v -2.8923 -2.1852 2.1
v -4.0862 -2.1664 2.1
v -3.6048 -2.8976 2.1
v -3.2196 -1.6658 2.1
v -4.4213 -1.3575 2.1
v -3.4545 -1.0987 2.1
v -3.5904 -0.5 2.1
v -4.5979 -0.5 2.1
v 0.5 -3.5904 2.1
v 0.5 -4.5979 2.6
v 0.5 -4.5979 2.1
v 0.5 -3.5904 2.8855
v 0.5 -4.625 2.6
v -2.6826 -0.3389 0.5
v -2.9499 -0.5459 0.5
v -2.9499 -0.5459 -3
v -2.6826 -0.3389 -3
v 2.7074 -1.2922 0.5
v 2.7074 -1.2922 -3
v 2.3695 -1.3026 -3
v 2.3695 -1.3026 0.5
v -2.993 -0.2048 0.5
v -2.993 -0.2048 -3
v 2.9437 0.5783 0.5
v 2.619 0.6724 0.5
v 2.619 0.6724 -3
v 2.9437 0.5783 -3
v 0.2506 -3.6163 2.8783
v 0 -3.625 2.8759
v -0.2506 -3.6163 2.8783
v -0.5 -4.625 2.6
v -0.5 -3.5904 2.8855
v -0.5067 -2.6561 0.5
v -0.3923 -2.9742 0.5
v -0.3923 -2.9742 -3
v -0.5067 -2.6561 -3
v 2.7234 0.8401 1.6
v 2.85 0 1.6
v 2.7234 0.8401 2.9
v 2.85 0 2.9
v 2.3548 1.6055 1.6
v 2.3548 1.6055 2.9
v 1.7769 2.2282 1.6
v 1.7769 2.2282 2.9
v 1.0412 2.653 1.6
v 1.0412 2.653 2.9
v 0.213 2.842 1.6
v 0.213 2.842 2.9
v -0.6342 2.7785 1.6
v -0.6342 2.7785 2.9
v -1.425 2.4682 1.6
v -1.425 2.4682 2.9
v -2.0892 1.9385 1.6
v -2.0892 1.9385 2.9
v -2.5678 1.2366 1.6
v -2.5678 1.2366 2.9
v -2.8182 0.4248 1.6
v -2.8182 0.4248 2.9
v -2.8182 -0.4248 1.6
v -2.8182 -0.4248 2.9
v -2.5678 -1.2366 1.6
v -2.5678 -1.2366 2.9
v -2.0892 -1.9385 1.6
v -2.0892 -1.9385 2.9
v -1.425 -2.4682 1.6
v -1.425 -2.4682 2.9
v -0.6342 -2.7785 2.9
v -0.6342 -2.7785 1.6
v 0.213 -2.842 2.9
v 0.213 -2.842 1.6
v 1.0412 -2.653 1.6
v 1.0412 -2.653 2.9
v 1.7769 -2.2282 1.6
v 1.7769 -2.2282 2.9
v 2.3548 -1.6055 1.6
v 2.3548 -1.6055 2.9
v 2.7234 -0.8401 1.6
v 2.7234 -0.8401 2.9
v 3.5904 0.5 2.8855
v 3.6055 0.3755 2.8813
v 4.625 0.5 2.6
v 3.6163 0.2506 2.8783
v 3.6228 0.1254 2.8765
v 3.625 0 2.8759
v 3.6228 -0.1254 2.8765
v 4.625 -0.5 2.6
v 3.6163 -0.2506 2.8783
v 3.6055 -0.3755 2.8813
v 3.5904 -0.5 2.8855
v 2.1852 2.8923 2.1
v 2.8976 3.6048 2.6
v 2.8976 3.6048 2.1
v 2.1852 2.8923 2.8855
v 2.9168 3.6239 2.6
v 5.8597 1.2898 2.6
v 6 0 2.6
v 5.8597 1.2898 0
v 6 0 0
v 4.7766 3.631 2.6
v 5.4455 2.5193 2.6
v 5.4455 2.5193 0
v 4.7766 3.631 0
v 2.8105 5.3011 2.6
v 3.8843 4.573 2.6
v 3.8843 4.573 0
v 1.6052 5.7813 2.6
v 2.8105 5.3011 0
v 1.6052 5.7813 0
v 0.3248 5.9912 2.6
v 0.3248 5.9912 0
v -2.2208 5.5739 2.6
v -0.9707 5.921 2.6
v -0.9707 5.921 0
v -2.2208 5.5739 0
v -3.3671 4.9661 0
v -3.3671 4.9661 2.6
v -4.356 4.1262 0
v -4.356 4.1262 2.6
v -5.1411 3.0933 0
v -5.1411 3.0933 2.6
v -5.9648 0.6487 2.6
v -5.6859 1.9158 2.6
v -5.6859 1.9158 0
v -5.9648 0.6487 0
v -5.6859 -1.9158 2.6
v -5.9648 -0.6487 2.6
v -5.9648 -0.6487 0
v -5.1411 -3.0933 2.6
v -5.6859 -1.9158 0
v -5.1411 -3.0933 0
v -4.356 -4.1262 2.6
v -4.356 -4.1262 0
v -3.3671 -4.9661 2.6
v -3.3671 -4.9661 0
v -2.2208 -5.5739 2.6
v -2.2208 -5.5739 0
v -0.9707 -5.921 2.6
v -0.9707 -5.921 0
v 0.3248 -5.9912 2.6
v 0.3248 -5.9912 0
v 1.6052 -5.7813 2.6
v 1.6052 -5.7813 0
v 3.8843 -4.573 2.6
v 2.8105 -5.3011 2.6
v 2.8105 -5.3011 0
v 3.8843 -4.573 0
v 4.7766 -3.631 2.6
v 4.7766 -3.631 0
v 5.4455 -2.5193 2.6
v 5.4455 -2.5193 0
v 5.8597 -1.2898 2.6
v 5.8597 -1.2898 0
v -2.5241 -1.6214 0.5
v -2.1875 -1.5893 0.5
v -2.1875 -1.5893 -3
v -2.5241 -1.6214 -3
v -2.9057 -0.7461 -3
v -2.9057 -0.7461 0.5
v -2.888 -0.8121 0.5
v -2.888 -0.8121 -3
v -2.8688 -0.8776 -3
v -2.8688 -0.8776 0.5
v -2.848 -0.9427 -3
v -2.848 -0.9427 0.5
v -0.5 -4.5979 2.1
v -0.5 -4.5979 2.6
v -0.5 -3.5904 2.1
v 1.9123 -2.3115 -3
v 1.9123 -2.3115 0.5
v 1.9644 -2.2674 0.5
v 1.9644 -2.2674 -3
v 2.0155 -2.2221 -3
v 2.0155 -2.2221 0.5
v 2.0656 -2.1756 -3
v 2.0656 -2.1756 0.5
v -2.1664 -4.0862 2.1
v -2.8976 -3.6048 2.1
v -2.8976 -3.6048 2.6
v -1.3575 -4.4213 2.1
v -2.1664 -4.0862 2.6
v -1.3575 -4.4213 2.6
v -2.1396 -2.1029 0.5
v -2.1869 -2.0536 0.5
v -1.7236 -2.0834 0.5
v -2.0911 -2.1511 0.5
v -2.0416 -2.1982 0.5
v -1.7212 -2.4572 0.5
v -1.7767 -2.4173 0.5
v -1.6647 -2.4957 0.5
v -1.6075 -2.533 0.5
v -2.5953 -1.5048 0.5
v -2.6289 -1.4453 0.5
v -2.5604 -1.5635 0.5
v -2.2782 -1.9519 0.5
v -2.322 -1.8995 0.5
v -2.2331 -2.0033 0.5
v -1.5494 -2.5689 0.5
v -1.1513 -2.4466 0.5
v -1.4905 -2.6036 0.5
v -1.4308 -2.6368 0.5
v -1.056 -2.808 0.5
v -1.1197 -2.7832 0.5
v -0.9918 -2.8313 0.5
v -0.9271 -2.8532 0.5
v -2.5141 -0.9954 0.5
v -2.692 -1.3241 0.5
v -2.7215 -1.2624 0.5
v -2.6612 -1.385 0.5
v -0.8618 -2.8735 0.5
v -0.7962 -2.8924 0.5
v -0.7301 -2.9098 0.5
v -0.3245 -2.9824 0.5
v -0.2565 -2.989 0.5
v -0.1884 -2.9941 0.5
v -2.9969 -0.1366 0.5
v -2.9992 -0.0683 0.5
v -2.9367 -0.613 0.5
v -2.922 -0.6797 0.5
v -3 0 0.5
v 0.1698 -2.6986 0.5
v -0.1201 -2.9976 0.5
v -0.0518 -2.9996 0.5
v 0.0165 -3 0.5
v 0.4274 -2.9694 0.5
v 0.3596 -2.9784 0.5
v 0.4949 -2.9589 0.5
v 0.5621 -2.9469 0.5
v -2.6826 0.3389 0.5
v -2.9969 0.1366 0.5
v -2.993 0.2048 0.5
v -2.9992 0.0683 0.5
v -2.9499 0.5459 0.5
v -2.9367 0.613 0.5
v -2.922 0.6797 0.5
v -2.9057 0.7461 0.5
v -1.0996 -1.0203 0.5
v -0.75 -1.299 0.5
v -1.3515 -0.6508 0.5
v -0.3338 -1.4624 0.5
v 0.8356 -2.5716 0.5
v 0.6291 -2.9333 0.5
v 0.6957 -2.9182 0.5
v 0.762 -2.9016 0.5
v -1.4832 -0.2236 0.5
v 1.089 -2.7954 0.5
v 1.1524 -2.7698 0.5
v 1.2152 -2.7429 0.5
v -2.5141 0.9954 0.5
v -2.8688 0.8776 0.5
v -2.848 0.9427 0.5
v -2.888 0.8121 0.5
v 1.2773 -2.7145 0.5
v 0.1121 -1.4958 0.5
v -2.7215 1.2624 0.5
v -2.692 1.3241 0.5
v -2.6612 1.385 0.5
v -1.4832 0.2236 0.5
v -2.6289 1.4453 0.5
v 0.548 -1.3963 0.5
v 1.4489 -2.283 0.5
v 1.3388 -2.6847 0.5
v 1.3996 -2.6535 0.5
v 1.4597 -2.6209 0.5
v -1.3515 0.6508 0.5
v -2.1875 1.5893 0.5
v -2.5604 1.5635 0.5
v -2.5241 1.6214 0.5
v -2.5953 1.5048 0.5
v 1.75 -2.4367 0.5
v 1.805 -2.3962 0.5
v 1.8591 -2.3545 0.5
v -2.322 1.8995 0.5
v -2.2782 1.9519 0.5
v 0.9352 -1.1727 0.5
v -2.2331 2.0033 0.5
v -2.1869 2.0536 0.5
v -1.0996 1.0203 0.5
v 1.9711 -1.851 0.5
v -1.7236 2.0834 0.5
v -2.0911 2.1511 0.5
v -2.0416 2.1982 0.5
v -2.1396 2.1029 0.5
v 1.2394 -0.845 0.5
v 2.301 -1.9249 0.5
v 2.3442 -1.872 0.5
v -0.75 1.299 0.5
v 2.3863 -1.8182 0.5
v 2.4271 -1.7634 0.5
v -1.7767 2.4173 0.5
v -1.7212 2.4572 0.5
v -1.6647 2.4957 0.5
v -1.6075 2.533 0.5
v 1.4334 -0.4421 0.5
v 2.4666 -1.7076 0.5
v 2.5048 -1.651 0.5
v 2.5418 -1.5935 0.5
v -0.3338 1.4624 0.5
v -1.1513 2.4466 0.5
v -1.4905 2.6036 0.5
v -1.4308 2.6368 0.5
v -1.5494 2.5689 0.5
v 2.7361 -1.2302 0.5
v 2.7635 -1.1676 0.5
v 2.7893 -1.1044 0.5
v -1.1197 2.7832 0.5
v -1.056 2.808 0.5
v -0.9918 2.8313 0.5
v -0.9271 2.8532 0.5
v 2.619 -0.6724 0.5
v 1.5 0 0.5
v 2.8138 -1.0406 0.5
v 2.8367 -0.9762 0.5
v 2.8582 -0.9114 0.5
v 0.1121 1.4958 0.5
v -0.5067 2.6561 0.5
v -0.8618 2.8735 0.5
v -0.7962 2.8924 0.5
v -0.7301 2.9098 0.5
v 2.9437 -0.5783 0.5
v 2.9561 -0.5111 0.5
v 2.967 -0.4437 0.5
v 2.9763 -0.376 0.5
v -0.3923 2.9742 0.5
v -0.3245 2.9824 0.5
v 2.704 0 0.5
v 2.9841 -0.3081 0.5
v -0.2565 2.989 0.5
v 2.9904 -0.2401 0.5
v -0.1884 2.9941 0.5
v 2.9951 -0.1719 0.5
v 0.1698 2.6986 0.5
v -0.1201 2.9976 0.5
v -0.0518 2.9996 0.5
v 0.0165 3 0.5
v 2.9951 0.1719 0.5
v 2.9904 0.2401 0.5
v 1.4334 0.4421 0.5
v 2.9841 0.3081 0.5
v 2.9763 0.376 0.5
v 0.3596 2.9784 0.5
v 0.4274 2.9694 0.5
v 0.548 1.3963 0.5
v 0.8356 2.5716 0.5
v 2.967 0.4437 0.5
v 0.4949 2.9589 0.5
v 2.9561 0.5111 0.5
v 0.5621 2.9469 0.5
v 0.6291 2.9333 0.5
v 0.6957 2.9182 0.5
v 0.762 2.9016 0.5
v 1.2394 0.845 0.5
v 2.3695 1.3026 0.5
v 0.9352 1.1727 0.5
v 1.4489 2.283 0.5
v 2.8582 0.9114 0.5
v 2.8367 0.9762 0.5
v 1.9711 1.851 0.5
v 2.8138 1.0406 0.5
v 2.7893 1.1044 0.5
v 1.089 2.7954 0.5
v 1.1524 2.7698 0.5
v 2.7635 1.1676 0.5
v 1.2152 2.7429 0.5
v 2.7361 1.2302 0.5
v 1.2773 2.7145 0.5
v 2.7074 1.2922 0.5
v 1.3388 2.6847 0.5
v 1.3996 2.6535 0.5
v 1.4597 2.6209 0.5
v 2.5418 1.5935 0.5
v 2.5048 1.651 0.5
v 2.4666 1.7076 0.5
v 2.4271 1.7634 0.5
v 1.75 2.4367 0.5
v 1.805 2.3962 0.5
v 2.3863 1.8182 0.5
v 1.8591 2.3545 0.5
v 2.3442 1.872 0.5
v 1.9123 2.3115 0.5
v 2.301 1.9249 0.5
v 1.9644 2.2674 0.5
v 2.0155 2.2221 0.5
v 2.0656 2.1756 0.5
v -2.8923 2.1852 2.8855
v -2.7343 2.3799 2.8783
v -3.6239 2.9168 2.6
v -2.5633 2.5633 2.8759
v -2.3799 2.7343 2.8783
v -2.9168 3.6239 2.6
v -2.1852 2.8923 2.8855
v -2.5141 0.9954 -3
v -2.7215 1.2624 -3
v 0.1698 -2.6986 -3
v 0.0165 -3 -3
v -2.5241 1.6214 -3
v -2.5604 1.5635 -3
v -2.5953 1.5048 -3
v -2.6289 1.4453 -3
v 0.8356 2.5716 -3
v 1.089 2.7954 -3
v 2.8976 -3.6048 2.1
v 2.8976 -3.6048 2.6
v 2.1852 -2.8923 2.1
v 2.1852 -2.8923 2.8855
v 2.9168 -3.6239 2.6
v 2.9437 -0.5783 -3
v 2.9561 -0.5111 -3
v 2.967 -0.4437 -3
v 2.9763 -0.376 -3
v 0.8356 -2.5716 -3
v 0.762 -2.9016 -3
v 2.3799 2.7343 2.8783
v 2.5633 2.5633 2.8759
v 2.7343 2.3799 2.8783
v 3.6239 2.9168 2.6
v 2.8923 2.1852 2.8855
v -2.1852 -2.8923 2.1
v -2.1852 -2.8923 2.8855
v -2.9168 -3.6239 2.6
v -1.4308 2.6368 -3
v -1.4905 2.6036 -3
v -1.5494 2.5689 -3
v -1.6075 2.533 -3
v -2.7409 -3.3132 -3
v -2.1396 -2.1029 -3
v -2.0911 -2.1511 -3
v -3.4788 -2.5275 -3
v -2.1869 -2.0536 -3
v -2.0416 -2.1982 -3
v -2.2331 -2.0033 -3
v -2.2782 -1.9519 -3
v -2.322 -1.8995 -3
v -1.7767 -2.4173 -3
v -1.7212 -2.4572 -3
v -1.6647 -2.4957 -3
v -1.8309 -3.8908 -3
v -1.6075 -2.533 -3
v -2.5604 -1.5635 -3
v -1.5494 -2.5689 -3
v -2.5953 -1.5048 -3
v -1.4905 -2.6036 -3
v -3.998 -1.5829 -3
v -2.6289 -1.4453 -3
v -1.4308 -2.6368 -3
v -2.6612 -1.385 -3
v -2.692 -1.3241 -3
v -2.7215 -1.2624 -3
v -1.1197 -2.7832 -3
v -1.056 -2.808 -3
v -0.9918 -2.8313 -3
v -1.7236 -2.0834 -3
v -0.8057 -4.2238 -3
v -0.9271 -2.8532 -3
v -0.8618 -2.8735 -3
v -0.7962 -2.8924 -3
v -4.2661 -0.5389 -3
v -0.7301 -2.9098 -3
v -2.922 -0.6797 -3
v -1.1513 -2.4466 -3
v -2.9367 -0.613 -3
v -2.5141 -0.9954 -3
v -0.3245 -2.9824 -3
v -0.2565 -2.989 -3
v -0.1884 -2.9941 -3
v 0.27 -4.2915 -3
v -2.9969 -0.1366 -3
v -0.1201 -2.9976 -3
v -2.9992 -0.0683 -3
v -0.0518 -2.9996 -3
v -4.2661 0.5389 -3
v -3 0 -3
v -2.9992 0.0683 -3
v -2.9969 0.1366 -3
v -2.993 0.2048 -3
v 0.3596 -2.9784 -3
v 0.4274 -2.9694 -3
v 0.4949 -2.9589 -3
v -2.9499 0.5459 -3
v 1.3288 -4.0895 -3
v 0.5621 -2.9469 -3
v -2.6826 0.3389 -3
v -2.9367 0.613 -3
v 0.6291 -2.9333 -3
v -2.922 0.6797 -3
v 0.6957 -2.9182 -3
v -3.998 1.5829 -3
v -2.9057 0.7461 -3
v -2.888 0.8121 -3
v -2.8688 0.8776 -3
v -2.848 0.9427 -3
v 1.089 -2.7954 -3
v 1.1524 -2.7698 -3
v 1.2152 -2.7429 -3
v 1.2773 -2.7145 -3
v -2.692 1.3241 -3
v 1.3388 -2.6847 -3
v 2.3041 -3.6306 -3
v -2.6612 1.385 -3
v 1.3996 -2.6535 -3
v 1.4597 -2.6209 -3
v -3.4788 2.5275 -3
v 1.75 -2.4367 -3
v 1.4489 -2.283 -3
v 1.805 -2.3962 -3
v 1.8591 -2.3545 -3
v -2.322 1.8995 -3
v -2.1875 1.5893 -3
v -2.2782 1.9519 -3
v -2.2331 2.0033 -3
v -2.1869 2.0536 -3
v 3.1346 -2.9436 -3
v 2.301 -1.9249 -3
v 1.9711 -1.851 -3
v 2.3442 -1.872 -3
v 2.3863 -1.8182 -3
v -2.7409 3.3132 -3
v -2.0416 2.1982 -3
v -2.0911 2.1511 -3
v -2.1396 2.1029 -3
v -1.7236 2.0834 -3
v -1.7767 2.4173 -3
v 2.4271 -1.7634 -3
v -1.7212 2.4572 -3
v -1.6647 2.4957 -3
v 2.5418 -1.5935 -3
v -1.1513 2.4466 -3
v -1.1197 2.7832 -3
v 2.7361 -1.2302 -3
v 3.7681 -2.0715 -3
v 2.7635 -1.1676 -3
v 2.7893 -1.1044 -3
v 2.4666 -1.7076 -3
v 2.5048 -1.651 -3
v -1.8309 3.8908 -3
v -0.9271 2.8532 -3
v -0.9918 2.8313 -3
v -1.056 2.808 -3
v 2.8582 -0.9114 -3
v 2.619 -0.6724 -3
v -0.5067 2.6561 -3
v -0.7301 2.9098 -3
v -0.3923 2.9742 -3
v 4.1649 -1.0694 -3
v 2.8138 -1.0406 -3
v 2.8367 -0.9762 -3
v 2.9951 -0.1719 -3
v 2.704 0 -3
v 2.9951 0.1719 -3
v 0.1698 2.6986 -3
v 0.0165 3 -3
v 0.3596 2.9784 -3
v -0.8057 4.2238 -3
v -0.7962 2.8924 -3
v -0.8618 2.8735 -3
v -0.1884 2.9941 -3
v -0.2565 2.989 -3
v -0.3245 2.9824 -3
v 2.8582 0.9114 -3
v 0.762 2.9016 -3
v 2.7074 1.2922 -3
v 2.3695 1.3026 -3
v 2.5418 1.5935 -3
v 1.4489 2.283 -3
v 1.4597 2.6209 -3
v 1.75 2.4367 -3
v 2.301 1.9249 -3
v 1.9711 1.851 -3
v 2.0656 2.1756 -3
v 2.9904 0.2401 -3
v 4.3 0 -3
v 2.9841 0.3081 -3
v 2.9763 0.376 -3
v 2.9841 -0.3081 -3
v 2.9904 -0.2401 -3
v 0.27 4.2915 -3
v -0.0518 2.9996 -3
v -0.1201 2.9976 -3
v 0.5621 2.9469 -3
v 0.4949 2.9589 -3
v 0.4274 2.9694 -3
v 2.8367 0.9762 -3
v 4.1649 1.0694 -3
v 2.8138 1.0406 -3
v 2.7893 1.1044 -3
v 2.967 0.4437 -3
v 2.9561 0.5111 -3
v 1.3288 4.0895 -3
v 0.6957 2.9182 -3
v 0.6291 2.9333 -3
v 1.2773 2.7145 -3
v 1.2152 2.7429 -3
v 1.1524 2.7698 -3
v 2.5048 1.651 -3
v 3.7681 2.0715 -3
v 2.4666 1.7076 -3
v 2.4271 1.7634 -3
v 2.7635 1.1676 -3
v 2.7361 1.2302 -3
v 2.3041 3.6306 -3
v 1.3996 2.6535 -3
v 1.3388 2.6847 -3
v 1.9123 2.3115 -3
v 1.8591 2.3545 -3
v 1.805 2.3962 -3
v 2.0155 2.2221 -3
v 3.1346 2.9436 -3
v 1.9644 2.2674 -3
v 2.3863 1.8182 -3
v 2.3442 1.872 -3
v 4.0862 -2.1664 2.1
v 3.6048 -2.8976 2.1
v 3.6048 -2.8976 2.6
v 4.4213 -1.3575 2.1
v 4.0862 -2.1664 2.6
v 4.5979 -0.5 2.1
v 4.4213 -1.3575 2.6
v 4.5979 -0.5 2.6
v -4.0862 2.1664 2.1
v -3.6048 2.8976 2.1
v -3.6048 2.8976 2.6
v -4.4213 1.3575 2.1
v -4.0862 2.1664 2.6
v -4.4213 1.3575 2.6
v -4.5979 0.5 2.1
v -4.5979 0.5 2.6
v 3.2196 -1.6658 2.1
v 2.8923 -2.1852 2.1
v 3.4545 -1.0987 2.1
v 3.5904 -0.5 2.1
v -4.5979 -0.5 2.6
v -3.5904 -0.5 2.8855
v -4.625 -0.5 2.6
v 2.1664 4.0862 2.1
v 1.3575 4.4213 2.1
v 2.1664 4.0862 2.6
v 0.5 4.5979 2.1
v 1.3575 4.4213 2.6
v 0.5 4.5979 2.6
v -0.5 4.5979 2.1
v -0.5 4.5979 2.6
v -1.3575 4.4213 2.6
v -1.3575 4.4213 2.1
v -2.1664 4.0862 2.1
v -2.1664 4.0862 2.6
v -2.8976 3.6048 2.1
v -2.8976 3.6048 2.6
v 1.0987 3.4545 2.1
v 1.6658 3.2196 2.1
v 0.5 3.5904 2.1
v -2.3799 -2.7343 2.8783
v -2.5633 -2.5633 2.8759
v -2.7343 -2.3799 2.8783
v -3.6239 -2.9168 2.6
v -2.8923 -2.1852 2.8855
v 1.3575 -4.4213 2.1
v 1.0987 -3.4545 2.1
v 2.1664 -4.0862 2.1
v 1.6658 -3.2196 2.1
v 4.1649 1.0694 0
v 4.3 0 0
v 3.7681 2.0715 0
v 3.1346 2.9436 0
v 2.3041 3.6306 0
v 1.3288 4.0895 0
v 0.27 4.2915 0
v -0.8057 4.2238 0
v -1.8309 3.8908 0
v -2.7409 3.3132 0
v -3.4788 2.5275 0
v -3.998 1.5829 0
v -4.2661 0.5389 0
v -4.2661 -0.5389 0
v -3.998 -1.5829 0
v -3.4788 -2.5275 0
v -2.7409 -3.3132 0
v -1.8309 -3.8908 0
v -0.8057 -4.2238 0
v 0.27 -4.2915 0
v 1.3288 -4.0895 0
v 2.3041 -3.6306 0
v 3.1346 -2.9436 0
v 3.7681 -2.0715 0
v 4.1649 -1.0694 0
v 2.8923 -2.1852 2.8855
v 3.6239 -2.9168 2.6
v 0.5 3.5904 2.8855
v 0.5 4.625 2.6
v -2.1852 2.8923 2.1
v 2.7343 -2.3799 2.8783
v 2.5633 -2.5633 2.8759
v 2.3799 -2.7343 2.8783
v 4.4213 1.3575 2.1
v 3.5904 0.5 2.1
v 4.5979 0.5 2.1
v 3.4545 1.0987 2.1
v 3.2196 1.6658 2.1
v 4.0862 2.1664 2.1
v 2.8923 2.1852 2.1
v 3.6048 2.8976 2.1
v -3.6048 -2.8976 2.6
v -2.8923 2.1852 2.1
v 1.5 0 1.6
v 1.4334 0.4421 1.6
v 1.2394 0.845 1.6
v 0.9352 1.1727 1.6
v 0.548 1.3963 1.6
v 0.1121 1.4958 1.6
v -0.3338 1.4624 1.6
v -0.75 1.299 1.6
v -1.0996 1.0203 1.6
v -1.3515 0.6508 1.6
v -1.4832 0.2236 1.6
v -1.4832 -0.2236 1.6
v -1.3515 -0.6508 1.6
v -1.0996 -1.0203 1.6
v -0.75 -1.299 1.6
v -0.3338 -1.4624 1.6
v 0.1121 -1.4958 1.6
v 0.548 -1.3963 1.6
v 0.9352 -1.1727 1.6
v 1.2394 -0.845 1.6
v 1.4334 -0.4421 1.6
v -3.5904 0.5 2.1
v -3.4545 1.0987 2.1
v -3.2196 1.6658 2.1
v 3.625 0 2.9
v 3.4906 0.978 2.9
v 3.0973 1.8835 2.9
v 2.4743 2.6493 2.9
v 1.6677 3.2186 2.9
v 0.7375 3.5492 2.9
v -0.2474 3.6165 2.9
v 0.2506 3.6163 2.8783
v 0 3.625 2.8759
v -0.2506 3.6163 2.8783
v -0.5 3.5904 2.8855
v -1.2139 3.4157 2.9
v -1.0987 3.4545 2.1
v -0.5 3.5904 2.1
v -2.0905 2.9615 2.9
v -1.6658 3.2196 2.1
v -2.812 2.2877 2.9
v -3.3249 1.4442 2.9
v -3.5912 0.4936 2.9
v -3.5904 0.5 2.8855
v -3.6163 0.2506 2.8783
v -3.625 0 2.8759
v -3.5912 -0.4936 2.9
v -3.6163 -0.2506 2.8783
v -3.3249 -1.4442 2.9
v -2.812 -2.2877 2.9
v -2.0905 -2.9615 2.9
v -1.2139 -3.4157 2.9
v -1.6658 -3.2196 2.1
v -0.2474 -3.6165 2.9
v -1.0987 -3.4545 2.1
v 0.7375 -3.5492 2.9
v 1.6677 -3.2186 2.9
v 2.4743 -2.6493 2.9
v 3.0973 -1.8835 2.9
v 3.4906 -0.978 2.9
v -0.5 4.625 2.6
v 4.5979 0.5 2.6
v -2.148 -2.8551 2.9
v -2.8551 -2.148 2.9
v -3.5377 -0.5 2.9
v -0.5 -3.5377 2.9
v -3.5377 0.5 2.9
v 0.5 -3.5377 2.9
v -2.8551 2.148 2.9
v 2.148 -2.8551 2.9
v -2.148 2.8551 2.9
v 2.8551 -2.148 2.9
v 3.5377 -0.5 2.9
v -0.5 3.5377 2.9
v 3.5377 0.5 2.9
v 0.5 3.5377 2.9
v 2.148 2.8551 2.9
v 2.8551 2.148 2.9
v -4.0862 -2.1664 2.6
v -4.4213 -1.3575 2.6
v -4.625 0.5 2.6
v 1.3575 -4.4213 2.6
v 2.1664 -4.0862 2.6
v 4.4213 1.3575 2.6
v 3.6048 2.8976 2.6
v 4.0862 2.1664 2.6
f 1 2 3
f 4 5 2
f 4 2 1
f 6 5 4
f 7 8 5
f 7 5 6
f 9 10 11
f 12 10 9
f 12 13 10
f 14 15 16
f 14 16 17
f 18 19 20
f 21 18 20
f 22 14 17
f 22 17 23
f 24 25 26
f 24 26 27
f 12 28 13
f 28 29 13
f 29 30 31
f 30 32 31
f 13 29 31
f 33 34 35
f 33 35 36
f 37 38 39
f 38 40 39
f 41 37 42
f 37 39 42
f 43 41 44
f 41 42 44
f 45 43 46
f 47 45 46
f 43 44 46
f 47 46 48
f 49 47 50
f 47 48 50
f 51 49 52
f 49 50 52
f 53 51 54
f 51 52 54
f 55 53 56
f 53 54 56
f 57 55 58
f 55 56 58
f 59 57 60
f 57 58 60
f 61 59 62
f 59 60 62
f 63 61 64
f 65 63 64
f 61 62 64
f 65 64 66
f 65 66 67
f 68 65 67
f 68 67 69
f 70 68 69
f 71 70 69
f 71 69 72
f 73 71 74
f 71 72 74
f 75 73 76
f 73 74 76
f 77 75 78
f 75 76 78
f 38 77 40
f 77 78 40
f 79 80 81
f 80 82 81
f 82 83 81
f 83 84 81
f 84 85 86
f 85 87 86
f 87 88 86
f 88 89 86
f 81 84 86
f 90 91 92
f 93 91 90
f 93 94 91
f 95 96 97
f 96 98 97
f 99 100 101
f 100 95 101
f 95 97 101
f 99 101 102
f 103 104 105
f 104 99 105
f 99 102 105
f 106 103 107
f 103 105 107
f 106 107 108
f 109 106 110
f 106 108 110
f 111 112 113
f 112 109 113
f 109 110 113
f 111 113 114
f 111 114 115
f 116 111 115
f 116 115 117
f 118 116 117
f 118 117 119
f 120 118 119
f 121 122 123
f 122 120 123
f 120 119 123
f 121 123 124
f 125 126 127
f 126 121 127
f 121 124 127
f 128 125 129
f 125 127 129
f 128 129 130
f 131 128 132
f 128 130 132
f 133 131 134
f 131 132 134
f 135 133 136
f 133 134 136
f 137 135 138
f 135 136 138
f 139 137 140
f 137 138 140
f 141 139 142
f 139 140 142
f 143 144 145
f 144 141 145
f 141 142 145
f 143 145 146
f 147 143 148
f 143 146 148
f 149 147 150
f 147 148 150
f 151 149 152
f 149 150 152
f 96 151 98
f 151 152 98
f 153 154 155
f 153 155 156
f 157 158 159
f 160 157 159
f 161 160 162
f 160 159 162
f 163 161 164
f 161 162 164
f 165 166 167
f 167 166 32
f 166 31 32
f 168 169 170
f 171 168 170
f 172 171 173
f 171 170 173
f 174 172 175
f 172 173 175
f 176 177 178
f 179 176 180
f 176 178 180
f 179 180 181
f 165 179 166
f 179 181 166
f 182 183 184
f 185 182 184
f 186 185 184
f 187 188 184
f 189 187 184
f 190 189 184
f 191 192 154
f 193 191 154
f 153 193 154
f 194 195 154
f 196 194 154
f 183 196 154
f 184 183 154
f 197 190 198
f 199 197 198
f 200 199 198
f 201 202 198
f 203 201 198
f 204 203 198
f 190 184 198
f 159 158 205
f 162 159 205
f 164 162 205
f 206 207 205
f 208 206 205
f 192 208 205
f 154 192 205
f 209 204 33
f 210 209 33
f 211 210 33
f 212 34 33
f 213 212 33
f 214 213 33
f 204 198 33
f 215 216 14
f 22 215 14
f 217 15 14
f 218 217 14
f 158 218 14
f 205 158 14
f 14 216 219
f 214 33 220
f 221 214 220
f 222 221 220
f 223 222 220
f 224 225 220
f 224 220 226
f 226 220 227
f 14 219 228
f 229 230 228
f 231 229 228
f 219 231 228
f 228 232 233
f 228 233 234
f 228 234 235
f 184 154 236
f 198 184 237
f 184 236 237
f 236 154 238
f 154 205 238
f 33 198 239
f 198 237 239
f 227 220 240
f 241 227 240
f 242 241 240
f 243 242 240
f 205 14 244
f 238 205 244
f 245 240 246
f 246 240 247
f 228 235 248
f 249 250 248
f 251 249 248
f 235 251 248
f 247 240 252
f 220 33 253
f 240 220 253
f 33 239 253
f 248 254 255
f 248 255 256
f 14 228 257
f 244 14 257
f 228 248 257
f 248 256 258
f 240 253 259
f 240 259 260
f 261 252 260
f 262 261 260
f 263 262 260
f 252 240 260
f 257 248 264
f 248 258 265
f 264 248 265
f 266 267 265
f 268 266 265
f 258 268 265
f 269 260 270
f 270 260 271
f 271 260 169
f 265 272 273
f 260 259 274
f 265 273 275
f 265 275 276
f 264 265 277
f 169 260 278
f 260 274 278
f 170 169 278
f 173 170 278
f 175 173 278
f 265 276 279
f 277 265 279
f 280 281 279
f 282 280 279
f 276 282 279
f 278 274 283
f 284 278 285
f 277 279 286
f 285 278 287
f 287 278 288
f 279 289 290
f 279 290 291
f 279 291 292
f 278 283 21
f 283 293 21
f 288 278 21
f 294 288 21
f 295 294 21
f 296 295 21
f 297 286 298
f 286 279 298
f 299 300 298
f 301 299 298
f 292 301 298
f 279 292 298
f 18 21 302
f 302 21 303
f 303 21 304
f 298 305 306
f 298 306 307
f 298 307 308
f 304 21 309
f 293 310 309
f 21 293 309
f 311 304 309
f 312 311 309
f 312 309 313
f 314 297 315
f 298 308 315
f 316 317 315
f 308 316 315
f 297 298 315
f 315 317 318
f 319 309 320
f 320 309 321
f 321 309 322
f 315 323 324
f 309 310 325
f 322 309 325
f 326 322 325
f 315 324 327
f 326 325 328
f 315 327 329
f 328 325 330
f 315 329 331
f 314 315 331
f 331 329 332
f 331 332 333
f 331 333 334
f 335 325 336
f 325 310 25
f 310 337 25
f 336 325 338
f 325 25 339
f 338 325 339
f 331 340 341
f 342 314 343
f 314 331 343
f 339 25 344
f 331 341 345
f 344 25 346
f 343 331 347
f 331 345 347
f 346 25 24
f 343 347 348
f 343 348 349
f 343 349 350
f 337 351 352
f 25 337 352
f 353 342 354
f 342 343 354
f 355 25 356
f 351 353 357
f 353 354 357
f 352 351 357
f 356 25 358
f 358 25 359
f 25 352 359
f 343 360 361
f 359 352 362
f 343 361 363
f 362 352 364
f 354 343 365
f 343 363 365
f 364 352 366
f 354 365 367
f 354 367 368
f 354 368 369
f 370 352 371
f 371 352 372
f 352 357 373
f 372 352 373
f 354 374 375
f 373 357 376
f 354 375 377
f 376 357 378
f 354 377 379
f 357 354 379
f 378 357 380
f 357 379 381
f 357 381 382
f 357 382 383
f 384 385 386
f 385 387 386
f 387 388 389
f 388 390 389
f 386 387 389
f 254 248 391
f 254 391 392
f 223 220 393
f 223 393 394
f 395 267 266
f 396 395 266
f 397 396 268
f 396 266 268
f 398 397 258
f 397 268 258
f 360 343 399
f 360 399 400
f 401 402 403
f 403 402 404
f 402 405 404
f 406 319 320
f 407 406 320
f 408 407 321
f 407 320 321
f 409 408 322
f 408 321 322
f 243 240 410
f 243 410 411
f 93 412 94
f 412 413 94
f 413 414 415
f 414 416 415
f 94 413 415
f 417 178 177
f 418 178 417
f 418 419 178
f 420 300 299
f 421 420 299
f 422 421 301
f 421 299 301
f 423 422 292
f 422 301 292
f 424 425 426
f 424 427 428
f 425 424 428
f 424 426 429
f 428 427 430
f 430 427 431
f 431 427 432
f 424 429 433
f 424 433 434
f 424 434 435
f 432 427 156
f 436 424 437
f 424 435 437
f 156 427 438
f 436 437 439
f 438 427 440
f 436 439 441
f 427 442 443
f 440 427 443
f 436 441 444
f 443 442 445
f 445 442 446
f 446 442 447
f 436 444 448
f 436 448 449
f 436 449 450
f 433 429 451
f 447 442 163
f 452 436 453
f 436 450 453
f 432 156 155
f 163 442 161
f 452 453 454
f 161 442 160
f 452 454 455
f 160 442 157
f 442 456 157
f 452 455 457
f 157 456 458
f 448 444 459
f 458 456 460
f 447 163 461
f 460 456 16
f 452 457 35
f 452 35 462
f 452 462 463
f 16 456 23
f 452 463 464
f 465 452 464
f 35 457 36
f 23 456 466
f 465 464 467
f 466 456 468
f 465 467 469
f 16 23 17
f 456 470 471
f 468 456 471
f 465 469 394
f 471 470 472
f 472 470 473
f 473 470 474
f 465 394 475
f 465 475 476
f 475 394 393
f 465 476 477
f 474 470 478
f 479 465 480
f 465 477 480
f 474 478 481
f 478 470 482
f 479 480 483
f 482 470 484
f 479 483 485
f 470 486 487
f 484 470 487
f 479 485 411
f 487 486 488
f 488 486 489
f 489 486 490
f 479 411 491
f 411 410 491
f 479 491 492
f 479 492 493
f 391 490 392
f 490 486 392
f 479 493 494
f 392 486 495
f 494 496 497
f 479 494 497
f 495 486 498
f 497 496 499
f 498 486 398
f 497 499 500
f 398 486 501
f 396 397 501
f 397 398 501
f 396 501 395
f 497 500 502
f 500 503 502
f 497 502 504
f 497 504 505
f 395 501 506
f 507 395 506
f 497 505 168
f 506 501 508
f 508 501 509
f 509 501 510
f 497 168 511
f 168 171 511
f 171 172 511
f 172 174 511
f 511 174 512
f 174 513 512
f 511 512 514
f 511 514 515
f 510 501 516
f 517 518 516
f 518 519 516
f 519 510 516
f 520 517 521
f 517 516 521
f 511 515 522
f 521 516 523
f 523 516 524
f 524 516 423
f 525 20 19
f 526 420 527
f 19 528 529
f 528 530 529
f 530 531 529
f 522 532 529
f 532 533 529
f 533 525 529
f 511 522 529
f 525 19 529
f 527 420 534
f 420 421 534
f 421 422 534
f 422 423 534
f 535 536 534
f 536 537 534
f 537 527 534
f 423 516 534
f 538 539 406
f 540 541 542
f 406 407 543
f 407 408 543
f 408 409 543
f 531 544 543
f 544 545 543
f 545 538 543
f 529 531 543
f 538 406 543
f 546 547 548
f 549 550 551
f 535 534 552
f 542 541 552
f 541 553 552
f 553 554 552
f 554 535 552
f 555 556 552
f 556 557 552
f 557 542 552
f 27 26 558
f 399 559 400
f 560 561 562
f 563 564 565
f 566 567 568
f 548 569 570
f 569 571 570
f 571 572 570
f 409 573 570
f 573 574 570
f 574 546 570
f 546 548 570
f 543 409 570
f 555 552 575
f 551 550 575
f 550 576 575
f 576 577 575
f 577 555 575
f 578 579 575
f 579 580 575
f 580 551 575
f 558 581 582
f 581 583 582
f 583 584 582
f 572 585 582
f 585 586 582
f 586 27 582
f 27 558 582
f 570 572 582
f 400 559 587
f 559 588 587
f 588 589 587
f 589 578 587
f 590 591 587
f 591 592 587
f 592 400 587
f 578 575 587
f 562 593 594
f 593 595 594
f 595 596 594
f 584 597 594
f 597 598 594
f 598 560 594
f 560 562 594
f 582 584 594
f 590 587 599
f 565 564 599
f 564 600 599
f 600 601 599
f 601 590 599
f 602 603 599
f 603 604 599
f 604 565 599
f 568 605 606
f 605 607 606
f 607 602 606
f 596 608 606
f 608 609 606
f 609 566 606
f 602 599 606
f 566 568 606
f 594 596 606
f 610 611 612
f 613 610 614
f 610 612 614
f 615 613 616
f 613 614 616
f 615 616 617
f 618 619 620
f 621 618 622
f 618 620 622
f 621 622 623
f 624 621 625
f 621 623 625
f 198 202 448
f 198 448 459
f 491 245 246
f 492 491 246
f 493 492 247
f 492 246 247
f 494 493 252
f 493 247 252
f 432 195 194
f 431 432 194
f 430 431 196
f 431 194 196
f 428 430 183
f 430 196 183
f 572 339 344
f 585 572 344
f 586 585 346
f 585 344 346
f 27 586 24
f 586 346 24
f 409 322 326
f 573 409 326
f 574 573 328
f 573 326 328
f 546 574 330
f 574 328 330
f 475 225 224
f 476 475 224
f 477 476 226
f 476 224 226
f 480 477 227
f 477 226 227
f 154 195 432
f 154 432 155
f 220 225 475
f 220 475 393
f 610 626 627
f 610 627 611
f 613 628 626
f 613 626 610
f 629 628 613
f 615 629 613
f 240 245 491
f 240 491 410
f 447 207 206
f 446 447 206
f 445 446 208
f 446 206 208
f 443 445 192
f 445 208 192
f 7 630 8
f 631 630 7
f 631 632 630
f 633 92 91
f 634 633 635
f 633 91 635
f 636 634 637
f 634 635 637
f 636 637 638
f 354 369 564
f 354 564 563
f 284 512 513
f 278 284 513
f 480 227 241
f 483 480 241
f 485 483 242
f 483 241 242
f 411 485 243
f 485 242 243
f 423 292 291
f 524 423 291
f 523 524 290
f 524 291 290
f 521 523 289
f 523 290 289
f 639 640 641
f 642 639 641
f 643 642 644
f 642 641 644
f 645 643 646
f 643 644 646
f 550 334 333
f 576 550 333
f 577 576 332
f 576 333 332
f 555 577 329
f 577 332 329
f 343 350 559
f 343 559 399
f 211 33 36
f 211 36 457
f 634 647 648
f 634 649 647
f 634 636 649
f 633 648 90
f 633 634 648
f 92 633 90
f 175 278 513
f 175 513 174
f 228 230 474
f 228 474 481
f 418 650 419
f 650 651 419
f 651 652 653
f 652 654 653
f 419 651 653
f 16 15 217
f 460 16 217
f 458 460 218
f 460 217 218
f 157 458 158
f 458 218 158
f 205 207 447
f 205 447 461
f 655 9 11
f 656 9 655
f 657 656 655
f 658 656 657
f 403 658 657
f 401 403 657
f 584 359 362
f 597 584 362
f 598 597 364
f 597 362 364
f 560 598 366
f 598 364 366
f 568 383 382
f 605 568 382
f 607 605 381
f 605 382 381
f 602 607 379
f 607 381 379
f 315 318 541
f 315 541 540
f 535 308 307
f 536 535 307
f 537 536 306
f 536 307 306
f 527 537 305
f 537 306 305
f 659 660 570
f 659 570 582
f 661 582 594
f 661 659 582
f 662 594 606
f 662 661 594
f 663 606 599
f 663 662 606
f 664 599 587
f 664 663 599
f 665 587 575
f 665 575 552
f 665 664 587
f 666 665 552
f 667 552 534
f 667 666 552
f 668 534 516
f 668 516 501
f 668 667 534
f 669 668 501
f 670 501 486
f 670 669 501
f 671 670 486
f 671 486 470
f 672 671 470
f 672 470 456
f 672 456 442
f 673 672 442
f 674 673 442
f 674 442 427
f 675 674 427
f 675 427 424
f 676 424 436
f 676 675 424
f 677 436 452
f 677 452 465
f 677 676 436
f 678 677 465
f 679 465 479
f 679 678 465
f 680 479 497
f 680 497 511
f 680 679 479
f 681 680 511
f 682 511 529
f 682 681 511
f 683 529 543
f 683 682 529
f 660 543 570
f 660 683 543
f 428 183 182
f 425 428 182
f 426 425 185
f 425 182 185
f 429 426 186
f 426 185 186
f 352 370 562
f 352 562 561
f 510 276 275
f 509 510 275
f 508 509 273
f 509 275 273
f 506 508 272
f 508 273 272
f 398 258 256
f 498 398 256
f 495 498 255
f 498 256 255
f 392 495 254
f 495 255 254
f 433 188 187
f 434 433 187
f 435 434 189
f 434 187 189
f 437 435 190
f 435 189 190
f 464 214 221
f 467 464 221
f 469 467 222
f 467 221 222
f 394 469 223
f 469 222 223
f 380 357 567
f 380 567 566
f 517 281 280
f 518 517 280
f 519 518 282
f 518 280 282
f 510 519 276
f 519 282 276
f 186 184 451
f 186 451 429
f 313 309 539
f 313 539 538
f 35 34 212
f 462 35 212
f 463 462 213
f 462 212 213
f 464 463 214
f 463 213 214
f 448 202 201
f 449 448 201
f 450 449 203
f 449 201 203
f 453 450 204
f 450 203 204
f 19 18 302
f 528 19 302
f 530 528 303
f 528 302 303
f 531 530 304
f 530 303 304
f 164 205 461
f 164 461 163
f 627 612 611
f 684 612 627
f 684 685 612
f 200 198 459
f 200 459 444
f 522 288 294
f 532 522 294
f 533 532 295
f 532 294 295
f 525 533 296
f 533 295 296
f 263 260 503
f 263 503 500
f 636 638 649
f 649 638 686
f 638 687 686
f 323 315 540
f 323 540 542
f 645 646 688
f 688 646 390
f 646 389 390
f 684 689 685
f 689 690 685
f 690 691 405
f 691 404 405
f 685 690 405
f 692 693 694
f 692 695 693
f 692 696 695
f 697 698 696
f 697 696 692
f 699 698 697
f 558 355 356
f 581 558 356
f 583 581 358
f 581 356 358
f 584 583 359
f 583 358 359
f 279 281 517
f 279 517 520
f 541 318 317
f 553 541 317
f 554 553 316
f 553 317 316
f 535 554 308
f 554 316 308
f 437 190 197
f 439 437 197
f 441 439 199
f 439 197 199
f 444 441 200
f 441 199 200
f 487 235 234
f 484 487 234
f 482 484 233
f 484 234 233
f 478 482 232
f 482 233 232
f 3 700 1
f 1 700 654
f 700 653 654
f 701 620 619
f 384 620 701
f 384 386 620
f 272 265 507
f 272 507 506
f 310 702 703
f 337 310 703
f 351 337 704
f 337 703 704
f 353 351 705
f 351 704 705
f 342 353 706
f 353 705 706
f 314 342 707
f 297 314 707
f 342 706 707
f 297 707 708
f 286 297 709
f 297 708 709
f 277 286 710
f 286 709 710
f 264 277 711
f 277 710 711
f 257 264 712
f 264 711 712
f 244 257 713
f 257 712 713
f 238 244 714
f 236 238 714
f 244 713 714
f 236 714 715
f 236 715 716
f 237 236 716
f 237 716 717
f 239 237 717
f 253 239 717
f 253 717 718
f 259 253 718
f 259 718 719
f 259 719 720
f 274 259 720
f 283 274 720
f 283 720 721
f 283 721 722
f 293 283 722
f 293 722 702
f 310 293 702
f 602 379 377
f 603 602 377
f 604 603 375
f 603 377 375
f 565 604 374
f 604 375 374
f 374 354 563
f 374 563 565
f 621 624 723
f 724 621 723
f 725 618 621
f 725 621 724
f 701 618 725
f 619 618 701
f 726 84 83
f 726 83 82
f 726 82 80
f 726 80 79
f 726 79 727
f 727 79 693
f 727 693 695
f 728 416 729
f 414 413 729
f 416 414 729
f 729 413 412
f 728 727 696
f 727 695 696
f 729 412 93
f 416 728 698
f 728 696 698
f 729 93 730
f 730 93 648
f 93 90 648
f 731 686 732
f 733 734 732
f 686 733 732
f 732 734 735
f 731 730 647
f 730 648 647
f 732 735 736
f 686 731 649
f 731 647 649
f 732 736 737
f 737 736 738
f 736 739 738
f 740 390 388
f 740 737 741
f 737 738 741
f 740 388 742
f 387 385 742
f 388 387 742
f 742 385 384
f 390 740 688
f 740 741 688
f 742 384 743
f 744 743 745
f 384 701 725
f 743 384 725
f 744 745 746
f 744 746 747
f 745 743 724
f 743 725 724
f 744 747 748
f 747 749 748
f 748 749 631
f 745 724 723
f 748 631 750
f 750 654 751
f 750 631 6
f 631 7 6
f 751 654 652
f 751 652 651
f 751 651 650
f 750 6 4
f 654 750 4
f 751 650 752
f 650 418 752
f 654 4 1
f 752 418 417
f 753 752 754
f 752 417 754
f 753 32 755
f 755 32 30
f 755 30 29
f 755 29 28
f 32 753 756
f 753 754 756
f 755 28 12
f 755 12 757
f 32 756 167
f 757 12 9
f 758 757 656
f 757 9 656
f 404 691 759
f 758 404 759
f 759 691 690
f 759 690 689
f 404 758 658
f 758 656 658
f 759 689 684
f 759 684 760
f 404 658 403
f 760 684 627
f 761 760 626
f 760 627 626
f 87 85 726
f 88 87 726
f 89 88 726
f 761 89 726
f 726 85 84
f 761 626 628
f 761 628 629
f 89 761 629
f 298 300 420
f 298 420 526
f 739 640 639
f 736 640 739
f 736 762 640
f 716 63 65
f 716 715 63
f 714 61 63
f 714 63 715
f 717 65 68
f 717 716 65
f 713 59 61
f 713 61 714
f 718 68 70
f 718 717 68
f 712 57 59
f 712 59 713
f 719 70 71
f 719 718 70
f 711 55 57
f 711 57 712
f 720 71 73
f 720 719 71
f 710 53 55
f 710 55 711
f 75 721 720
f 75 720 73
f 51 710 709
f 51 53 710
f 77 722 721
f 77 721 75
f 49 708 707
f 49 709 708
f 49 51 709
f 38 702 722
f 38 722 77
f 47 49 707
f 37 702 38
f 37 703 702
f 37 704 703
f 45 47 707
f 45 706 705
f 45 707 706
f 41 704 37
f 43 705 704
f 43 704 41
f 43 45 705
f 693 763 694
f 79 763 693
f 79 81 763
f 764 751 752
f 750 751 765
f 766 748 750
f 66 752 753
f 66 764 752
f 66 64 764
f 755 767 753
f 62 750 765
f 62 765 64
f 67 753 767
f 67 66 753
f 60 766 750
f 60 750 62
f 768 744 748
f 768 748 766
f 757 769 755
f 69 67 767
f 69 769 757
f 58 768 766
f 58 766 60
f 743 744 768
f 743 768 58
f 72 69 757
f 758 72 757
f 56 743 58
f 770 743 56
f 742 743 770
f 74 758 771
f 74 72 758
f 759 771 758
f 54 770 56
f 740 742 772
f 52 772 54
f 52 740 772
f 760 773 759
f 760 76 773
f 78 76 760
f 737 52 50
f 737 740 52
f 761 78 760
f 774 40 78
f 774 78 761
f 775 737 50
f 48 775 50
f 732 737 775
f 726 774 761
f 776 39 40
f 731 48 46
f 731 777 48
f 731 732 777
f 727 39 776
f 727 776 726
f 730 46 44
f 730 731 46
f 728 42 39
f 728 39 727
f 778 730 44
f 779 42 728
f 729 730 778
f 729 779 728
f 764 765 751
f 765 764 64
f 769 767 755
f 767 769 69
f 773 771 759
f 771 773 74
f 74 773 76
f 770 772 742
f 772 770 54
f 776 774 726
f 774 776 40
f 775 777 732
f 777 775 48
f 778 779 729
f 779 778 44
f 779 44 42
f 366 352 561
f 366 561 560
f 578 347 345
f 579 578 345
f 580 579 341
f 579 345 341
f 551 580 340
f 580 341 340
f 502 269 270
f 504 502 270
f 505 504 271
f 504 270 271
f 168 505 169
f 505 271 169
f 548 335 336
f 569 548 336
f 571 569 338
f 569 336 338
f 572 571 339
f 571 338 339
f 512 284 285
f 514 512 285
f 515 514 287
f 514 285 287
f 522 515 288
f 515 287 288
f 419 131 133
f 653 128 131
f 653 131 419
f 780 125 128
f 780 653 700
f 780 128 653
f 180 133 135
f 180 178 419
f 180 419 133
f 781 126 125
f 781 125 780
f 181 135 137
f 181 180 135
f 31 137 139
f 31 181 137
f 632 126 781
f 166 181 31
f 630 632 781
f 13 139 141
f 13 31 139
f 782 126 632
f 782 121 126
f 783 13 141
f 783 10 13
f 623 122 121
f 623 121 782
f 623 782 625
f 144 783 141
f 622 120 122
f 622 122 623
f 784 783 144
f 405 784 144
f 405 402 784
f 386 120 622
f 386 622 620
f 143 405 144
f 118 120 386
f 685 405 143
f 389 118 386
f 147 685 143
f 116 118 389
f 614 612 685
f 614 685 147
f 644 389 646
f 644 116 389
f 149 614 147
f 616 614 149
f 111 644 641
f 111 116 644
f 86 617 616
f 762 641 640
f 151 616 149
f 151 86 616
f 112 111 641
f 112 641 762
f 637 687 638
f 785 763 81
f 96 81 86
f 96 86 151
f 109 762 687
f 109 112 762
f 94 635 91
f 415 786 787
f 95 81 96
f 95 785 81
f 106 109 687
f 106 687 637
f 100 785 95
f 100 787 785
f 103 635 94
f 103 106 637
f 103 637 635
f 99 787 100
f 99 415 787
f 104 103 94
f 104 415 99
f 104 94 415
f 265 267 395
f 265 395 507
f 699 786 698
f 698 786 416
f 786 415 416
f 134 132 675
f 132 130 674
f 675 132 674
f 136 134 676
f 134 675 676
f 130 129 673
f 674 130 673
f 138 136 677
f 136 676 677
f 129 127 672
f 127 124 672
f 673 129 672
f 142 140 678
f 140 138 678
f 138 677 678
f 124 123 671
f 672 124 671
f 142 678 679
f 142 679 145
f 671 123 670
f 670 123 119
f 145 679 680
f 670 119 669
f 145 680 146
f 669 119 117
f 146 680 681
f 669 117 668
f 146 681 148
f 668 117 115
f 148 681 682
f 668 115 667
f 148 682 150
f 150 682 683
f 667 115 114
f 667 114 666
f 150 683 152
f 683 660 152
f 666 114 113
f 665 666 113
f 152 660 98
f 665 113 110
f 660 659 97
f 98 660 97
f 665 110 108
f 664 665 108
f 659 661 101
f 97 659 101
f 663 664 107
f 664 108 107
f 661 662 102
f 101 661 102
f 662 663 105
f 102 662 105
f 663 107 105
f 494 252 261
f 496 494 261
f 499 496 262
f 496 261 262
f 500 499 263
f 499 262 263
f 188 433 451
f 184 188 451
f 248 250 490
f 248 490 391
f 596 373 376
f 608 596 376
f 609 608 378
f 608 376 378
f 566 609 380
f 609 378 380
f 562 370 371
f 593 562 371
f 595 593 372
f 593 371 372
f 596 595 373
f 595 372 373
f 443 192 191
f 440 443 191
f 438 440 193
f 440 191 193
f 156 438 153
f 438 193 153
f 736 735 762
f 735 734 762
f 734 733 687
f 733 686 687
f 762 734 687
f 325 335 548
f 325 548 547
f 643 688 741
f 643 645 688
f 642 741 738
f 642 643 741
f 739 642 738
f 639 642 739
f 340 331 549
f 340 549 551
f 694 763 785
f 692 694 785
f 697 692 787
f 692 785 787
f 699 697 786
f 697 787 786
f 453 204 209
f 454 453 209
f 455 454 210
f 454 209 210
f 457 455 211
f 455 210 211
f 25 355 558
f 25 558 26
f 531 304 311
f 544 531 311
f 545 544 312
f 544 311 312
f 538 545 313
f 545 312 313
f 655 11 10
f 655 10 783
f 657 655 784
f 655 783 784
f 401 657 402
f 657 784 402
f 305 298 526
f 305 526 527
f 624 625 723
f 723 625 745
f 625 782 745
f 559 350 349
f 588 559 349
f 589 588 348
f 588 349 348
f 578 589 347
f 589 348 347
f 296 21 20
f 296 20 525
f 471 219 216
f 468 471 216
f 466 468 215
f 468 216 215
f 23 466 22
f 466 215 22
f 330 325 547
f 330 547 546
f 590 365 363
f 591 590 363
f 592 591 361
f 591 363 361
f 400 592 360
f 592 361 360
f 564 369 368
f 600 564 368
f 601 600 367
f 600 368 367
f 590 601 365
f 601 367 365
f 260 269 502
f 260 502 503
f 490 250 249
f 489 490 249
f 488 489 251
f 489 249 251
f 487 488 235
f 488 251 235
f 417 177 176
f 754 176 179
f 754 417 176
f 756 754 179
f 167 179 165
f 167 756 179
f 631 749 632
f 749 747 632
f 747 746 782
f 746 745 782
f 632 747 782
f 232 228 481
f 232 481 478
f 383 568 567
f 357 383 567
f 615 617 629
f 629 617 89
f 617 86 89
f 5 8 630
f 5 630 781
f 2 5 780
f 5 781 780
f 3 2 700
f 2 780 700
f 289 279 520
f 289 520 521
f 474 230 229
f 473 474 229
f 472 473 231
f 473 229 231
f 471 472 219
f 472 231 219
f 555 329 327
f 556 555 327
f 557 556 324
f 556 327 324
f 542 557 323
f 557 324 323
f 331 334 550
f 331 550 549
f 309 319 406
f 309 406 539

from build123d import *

# Parameters (mm, degrees)
PAD008_DEPTH          = 2.6
SKETCH020_R           = 3.625
SKETCH020_R_2         = 2.85
PAD009_DEPTH          = 2.9
SKETCH021_R           = 4.625
SKETCH021_R_2         = 3.625
POCKET011_DEPTH       = 0.5
PAD010_DEPTH          = 0.5
POLARPATTERN006_COUNT = 8
SKETCH023_R           = 2.85
POCKET012_DEPTH       = 1.3
SKETCH024_R           = 1.5
POCKET013_DEPTH       = 5
SKETCH025_R           = 0.75
POCKET014_DEPTH       = 5
POLARPATTERN007_COUNT = 4
SKETCH026_R           = 4.3
PAD011_DEPTH          = 3
POCKET015_DEPTH       = 5
POCKET015_DEPTH_BACK  = 0.5
POLARPATTERN008_COUNT = 25
FILLET001_R           = 1
SKETCH028_R           = 25
SKETCH028_R_2         = 6
POCKET016_DEPTH       = 5


with BuildPart() as part:
    # Sketch019 → Pad008 (new body)
    with BuildSketch(Plane.XY):
        with BuildLine():
            ThreePointArc((3.1440666838, 19.7956884151), (0, 22.4), (-3.1440666838, 19.7956884151))
            Line((-3.1440666838, 19.7956884151), (-5, 10))
            Line((-5, 10), (-5, 5))
            Line((-5, 5), (-10, 5))
            Line((-10, 5), (-19.7956884151, 3.1440666838))
            ThreePointArc((-19.7956884151, 3.1440666838), (-22.4, 0), (-19.7956884151, -3.1440666838))
            Line((-10, -5), (-19.7956884151, -3.1440666838))
            Line((-5, -5), (-10, -5))
            Line((-5, -10), (-5, -5))
            Line((-3.1440666838, -19.7956884151), (-5, -10))
            ThreePointArc((-3.1440666838, -19.7956884151), (0, -22.4), (3.1440666838, -19.7956884151))
            Line((3.1440666838, -19.7956884151), (5, -10))
            Line((5, -10), (5, -5))
            Line((5, -5), (10, -5))
            Line((10, -5), (19.7956884151, -3.1440666838))
            ThreePointArc((19.7956884151, -3.1440666838), (22.4, 0), (19.7956884151, 3.1440666838))
            Line((10, 5), (19.7956884151, 3.1440666838))
            Line((5, 5), (10, 5))
            Line((5, 10), (5, 5))
            Line((3.1440666838, 19.7956884151), (5, 10))
        make_face()
    extrude(amount=PAD008_DEPTH)

    # Sketch020 → Pad009 (join)
    with BuildSketch(Plane.XY):
        Circle(SKETCH020_R)
        Circle(SKETCH020_R_2, mode=Mode.SUBTRACT)
    extrude(amount=PAD009_DEPTH)

    # Sketch021 (on Face5 of Pad009) → Pocket011 (cut)
    with BuildSketch(Plane.XY.offset(2.6)):
        Circle(SKETCH021_R)
        Circle(SKETCH021_R_2, mode=Mode.SUBTRACT)
    extrude(amount=-POCKET011_DEPTH, mode=Mode.SUBTRACT)

    # Sketch022 → Pad010 (join, symmetric)
    with BuildSketch(Plane.XZ):
        Polygon((3.537661, 2.9), (4.625, 2.6), (4.625, 2.1), (3.537661, 2.1), align=None)
    pad010 = extrude(amount=PAD010_DEPTH, both=True)

    # PolarPattern006: Pad010 ×8 about axis
    polarpattern006_axis = Axis((0, 0, 0), (0, 0, 1))
    for i in range(1, POLARPATTERN006_COUNT):
        add(pad010.rotate(polarpattern006_axis, i * 360 / POLARPATTERN006_COUNT))

    # Sketch023 (on Face74 of PolarPattern006) → Pocket012 (cut)
    with BuildSketch(Plane.XY.offset(2.9)):
        Circle(SKETCH023_R)
    extrude(amount=-POCKET012_DEPTH, mode=Mode.SUBTRACT)

    # Sketch024 (on Face66 of Pocket012) → Pocket013 (cut)
    with BuildSketch(Plane.XY.offset(1.6)):
        Circle(SKETCH024_R)
    extrude(amount=-POCKET013_DEPTH, mode=Mode.SUBTRACT)

    # Sketch025 → Pocket014 (cut)
    with BuildSketch(Plane.XY):
        with Locations((8.8, 0)):
            Circle(SKETCH025_R)
        with Locations((12.17411, 0)):
            Circle(SKETCH025_R)
        with Locations((15.54822, 0)):
            Circle(SKETCH025_R)
        with Locations((18.92233, 0)):
            Circle(SKETCH025_R)
    pocket014 = extrude(amount=POCKET014_DEPTH, mode=Mode.SUBTRACT)

    # PolarPattern007: Pocket014 ×4 about axis
    polarpattern007_axis = Axis((0, 0, 0), (0, 0, 1))
    for i in range(1, POLARPATTERN007_COUNT):
        add(pocket014.rotate(polarpattern007_axis, i * 360 / POLARPATTERN007_COUNT), mode=Mode.SUBTRACT)

    # Sketch026 → Pad011 (join)
    with BuildSketch(Plane.XY):
        Circle(SKETCH026_R)
    extrude(amount=-PAD011_DEPTH)

    # Sketch027 → Pocket015 (cut, two sides)
    with BuildSketch(Plane.XY) as pocket015_sk:
        with BuildLine():
            ThreePointArc((2.9950699672, 0.1719182704), (2.9874502188, 0.2741189345), (2.9763441039, 0.3759997007))
            Line((0, 0), (2.9763441039, 0.3759997007))
            Line((0, 0), (2.9763441039, -0.3759997007))
            ThreePointArc((2.9763441039, -0.3759997007), (2.9874502188, -0.2741189345), (2.9950699672, -0.1719182704))
            Line((2.703959, 0), (2.9950699672, -0.1719182704))
            Line((2.9950699672, 0.1719182704), (2.703959, 0))
        make_face()
    pocket015 = extrude(amount=-POCKET015_DEPTH, mode=Mode.SUBTRACT) + extrude(pocket015_sk.sketch, amount=POCKET015_DEPTH_BACK, mode=Mode.SUBTRACT)

    # PolarPattern008: Pocket015 ×25 about axis
    polarpattern008_axis = Axis((0, 0, 0), (0, 0, 1))
    for i in range(1, POLARPATTERN008_COUNT):
        add(pocket015.rotate(polarpattern008_axis, i * 360 / POLARPATTERN008_COUNT), mode=Mode.SUBTRACT)

    # Fillet001
    fillet001_edges = [part.edges().sort_by_distance(p)[0] for p in [
        (-5, -5, 1.3),
        (5, -5, 1.3),
        (5, 5, 1.3),
        (-5, 5, 1.3),
    ]]
    fillet(fillet001_edges, radius=FILLET001_R)

    # Sketch028 → Pocket016 (cut, symmetric)
    with BuildSketch(Plane.XY):
        Circle(SKETCH028_R)
        Circle(SKETCH028_R_2, mode=Mode.SUBTRACT)
    extrude(amount=POCKET016_DEPTH, both=True, mode=Mode.SUBTRACT)


solid = part.part
